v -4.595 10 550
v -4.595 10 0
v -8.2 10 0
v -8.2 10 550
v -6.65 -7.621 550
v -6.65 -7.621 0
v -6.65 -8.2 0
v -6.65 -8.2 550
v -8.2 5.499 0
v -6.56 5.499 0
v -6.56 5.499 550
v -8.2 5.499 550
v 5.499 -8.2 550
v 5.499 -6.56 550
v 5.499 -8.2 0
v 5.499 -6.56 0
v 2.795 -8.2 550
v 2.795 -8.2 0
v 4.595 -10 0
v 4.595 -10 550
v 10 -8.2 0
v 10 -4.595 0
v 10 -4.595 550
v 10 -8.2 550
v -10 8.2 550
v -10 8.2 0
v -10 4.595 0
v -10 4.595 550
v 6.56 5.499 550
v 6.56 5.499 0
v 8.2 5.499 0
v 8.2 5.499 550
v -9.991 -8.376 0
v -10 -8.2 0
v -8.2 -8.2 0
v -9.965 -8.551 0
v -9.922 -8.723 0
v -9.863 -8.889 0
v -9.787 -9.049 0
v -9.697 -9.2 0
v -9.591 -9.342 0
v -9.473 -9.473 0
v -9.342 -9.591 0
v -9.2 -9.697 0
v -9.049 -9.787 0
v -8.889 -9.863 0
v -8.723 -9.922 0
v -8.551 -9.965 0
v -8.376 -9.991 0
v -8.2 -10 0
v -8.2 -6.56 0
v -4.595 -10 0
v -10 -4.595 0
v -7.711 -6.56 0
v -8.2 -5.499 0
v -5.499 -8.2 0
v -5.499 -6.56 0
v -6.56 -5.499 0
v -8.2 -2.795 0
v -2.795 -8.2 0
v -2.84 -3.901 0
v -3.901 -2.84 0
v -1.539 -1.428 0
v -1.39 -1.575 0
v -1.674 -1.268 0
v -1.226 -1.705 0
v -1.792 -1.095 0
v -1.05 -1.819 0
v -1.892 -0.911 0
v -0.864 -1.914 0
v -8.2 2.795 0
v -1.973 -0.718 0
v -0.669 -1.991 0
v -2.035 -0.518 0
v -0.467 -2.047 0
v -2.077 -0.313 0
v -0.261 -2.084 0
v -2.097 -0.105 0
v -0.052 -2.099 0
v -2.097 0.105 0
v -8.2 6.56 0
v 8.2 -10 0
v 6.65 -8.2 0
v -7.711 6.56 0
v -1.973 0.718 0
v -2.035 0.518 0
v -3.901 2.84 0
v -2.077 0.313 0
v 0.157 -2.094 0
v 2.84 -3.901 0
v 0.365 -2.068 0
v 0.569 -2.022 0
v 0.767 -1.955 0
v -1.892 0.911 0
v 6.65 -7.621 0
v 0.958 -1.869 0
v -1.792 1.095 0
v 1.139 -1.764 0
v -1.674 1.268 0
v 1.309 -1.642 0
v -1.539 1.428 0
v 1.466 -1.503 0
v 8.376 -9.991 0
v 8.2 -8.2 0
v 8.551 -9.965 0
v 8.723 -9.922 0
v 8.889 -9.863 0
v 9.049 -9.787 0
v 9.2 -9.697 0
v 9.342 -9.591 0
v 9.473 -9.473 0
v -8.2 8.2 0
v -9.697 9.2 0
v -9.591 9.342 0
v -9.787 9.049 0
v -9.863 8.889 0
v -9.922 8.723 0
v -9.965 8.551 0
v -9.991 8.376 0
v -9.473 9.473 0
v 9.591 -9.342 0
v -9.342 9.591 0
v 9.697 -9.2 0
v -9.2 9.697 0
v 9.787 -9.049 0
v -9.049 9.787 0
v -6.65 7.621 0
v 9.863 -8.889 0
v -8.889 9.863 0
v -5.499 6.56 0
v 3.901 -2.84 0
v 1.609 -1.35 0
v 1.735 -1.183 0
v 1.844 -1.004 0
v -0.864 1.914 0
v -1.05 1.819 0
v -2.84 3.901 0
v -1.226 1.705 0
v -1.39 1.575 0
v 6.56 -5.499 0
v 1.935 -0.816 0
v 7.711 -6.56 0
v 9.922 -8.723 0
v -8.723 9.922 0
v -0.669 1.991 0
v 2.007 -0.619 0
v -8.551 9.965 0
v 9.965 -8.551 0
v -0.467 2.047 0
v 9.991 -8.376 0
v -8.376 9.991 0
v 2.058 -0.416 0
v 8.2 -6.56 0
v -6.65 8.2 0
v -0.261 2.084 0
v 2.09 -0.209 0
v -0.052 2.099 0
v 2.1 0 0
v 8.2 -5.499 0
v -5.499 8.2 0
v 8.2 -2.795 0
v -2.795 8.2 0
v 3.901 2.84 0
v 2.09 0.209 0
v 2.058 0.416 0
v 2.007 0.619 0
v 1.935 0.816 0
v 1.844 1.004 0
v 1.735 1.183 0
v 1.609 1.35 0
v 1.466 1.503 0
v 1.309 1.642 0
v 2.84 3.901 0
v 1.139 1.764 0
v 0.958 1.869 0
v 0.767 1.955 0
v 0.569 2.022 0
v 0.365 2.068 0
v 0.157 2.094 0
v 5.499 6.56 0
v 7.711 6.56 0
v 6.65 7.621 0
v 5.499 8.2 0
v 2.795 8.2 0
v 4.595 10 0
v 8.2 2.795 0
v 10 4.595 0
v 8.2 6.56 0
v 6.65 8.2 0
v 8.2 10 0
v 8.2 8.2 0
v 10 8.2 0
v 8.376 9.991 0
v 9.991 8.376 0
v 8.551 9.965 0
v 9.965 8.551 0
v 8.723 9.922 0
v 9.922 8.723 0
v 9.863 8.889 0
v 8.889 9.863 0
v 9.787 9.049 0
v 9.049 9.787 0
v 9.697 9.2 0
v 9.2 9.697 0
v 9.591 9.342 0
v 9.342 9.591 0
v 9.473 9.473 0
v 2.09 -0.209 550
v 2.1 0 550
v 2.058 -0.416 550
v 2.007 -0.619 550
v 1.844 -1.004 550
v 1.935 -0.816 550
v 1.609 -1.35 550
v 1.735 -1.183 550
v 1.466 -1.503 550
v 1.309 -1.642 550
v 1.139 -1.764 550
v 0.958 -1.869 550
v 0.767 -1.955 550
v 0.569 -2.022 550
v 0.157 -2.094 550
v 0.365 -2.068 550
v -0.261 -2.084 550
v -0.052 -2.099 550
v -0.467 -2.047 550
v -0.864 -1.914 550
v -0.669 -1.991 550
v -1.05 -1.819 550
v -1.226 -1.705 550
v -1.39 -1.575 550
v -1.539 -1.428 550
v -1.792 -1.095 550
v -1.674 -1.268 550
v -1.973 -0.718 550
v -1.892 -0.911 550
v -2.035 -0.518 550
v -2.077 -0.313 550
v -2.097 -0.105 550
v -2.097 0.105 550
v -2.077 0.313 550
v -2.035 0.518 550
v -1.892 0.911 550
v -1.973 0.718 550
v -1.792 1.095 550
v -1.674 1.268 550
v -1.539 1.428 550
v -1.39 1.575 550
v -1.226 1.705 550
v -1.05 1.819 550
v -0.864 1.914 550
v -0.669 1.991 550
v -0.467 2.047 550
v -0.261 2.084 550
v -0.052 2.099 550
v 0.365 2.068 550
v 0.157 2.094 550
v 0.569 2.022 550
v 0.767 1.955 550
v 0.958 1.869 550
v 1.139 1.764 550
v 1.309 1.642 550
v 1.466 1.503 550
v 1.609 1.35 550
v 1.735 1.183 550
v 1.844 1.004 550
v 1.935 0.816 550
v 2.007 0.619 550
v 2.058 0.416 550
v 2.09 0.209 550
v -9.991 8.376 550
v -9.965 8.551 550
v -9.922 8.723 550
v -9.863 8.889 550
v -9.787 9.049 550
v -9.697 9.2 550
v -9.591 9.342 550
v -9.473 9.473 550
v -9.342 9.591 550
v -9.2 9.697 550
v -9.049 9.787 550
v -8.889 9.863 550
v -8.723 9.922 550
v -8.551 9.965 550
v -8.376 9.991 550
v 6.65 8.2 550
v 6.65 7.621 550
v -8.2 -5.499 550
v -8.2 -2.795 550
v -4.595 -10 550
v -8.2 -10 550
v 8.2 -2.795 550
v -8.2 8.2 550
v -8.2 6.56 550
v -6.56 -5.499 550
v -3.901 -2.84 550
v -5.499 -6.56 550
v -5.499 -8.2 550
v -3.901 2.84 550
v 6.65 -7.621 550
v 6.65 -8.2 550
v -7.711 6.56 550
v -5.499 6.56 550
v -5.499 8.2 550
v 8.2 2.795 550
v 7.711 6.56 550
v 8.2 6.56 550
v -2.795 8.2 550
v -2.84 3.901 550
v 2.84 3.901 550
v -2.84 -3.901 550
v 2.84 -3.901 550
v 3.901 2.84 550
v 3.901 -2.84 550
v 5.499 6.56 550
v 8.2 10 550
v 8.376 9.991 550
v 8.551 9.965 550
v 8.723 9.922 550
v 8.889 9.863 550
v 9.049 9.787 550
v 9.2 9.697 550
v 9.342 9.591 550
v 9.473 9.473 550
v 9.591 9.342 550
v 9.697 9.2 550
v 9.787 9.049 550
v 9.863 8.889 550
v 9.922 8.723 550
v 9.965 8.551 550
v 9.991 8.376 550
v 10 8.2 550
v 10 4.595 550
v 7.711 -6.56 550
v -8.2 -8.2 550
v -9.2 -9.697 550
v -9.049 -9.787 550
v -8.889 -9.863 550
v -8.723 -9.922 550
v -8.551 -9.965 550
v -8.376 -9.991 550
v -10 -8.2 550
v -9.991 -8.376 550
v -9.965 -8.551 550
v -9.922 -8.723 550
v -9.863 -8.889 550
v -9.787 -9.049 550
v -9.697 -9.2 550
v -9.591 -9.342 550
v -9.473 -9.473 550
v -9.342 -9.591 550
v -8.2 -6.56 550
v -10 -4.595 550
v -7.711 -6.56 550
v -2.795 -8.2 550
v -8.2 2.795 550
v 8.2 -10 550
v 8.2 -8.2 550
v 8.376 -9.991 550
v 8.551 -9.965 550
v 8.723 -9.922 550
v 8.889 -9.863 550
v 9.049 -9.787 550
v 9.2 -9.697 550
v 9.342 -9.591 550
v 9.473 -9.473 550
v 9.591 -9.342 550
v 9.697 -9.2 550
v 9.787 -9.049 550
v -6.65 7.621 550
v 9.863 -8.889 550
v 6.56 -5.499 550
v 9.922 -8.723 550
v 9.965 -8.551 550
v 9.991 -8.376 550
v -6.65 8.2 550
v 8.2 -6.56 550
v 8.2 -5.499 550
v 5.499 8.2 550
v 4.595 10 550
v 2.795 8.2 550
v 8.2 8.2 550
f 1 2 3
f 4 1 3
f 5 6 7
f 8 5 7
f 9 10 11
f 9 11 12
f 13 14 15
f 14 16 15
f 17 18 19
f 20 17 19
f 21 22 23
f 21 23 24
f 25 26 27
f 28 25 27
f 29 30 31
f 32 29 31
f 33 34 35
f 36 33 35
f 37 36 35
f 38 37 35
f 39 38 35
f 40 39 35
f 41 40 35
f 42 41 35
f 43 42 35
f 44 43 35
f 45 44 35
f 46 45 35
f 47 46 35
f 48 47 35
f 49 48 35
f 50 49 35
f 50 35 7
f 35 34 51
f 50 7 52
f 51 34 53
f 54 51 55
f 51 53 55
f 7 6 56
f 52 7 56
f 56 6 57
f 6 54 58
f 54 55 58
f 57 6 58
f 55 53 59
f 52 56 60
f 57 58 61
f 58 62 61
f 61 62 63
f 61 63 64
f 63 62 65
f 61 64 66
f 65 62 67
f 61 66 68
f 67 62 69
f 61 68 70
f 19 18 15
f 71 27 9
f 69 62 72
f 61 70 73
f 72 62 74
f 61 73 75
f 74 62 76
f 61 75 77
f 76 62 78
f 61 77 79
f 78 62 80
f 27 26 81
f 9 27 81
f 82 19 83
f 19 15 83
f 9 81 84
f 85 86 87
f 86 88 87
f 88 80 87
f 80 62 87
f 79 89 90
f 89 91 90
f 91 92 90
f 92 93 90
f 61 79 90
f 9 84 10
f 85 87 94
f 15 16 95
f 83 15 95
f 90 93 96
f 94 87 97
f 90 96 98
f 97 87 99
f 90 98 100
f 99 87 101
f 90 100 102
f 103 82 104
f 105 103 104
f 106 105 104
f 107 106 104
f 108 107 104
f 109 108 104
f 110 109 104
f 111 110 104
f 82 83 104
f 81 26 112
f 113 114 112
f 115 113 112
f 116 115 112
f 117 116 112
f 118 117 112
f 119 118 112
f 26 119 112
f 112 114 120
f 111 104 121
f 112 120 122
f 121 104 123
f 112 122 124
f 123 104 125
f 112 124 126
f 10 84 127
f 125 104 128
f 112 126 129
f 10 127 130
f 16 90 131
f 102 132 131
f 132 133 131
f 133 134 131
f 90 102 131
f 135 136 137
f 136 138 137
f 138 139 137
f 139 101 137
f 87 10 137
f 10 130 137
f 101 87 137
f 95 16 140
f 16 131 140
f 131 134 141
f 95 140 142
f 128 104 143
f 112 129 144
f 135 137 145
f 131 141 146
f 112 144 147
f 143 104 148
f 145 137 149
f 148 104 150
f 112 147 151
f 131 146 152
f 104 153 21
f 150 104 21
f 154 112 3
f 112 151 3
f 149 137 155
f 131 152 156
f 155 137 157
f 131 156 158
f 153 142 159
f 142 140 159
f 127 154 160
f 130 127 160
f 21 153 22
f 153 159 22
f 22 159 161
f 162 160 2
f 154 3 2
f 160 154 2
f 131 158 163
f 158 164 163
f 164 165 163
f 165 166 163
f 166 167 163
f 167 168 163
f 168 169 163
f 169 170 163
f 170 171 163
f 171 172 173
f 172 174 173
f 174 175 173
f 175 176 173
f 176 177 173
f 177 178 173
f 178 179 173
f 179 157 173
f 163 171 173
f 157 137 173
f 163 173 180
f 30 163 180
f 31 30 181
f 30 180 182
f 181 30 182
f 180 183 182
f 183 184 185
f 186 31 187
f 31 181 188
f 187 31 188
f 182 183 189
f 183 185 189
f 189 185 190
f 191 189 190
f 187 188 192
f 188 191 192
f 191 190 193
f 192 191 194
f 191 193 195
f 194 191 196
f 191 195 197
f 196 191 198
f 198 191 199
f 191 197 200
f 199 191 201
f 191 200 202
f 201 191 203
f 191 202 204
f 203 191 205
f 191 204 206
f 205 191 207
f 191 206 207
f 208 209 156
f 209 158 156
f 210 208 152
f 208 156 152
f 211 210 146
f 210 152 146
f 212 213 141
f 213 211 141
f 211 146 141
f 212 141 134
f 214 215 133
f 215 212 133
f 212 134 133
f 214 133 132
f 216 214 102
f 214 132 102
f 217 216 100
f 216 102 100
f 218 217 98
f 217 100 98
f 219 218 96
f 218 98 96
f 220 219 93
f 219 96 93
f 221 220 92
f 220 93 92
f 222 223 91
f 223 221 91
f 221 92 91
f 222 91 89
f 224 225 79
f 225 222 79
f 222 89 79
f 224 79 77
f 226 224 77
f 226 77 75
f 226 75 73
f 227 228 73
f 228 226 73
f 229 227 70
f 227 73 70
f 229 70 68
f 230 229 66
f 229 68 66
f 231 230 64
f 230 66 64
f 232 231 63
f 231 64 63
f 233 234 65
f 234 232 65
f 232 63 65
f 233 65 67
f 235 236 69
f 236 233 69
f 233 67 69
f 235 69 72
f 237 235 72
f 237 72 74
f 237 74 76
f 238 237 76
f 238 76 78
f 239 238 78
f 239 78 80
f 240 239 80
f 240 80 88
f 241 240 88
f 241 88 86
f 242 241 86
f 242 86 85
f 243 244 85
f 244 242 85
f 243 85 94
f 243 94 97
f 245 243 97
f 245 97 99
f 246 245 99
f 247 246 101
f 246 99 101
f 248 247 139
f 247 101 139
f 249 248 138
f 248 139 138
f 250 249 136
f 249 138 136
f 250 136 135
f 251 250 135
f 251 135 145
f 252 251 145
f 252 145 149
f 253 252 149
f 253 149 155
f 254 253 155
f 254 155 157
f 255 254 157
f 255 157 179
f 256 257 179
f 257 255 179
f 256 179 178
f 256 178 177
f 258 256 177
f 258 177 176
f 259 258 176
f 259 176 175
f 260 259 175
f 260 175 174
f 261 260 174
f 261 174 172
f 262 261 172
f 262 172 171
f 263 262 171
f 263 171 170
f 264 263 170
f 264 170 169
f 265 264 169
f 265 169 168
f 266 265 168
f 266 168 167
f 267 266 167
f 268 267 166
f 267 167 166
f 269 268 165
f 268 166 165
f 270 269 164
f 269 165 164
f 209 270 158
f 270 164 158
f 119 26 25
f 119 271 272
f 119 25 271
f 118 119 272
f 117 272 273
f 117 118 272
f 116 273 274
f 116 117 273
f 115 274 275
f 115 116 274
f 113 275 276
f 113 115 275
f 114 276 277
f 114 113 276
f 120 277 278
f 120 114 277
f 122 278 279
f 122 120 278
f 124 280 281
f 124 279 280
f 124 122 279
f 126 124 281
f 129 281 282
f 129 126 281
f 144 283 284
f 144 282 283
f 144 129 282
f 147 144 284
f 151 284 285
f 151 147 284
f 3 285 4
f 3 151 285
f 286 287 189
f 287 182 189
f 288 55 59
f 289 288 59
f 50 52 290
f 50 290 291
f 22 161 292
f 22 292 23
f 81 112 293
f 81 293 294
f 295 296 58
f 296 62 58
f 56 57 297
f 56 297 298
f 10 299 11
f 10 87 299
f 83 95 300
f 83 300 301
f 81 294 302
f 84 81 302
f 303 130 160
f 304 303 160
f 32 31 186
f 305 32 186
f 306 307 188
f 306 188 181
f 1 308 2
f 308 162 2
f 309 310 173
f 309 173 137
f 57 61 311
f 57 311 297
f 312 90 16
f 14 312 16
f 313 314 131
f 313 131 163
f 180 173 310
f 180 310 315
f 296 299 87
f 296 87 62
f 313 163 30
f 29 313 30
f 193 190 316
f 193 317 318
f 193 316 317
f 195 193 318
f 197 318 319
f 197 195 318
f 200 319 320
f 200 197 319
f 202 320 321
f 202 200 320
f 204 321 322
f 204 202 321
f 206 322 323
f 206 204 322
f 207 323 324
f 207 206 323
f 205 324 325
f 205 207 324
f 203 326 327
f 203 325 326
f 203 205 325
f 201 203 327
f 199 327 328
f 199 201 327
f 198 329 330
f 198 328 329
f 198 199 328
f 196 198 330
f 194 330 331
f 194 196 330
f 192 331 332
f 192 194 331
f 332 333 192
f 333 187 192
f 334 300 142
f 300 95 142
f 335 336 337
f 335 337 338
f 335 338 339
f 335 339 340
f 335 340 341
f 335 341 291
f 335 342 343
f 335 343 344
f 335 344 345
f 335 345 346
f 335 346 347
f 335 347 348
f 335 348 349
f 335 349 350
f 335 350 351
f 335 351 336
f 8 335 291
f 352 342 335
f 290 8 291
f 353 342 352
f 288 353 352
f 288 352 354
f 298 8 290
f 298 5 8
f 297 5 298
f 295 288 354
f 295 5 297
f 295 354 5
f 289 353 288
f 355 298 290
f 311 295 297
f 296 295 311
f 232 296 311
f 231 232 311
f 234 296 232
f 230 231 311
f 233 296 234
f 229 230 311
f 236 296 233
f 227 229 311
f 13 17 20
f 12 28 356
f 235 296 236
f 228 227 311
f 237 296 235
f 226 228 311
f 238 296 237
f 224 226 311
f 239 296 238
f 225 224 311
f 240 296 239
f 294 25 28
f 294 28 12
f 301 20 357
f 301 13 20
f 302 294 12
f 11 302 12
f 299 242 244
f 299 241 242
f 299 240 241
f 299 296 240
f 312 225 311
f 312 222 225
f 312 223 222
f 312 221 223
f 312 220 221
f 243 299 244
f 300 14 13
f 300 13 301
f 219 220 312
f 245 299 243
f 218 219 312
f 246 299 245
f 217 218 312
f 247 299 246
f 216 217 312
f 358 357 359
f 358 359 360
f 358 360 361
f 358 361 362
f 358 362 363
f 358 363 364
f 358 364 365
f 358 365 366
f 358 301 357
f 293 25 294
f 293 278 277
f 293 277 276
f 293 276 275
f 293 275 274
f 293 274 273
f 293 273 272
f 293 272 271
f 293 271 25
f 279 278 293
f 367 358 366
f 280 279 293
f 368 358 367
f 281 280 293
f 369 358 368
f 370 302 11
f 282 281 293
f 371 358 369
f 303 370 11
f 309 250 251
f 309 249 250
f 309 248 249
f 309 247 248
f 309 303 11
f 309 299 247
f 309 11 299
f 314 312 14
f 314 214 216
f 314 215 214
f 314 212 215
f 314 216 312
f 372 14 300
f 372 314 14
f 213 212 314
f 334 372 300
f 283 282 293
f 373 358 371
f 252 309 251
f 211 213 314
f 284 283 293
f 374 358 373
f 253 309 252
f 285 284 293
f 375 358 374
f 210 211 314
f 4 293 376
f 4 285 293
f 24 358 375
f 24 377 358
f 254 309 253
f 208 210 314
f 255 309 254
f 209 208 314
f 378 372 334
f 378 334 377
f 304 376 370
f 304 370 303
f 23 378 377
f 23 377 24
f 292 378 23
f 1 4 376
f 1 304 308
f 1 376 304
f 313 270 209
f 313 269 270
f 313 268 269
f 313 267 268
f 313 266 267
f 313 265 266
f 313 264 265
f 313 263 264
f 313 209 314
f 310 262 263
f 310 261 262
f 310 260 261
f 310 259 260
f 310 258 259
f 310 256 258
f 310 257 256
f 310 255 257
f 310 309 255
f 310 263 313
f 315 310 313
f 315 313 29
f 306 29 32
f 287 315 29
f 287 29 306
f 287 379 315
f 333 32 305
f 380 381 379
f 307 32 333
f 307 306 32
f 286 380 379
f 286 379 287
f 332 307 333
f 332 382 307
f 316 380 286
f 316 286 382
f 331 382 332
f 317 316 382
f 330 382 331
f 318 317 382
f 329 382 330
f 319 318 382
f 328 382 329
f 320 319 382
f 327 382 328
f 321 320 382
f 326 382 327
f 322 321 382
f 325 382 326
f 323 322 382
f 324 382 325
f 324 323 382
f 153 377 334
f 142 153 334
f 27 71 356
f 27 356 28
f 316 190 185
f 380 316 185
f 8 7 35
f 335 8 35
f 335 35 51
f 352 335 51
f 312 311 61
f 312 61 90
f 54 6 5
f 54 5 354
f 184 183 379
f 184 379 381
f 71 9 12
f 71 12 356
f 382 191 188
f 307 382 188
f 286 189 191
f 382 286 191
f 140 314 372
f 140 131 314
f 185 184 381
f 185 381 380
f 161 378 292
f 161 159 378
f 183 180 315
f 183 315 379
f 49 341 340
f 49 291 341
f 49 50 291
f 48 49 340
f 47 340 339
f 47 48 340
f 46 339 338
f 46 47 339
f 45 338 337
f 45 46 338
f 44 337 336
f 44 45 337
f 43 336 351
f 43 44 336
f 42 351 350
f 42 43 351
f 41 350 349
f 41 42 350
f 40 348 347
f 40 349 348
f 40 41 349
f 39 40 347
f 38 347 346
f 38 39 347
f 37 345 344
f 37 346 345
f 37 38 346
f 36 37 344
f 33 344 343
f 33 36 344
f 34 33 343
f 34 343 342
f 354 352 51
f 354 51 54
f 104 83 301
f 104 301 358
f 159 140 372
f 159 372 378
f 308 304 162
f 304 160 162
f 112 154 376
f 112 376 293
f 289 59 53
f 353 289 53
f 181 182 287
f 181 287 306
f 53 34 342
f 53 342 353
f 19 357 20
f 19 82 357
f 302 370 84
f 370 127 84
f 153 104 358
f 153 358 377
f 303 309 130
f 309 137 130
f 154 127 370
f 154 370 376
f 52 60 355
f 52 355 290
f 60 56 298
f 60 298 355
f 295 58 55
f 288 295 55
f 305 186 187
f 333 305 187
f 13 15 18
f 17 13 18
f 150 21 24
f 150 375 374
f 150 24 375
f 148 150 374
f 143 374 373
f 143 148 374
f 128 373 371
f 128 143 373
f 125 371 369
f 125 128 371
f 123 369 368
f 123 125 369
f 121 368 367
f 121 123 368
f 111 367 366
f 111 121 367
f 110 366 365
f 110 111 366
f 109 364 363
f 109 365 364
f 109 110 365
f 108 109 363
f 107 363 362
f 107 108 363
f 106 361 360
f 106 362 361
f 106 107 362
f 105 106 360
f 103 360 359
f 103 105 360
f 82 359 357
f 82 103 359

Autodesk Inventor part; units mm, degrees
ref_plane "YZ Plane" through (0, 0, 0) normal (1, 0, 0) x (0, 1, 0)
ref_plane "Start Plane" through (0, 0, 0) normal (0, 0, 1) x (1, 0, 0)
ref_plane "End Plane" through (0, 0, 550) normal (0, 0, 1) x (1, 0, 0)
sketch "Sketch1" plane through (0, 0, 0) normal (0, 0, 1) x (1, 0, 0)
  line L0 (10, -4.5951) -> (10, -8.2)
  line L1 (-10, -8.2) -> (-10, -4.5951)
  line L2 (-10, 10) -> (10, -10) construction
  line L3 (10, 10) -> (-10, -10) construction
  circle A0 centre (0, 0) radius 2.1
  line L4 (-2.84, -3.9007) -> (2.84, -3.9007)
  line L5 (3.9007, -2.84) -> (3.9007, 2.84)
  line L6 (2.84, 3.9007) -> (-2.84, 3.9007)
  line L7 (-3.9007, 2.84) -> (-3.9007, -2.84)
  line L8 (-3.9007, -3.9007) -> (3.9007, 3.9007) construction
  line L9 (3.9007, -3.9007) -> (-3.9007, 3.9007) construction
  line L10 (-3.9007, -2.84) -> (-2.84, -3.9007) construction
  line L11 (-2.84, -3.9007) -> (-5.4993, -6.56)
  line L12 (-5.4993, -6.56) -> (-5.4993, -8.2)
  line L13 (-5.4993, -8.2) -> (-2.7951, -8.2)
  line L14 (-2.7951, -8.2) -> (-4.5951, -10)
  line L15 (0, 0) -> (0, -3.9007) construction
  line L16 (3.9007, -2.84) -> (2.84, -3.9007) construction
  line L17 (2.84, -3.9007) -> (5.4993, -6.56)
  line L18 (5.4993, -6.56) -> (5.4993, -8.2)
  line L19 (5.4993, -8.2) -> (2.7951, -8.2)
  line L20 (2.7951, -8.2) -> (4.5951, -10)
  line L21 (-2.84, -3.9007) -> (-3.9007, -2.84) construction
  line L22 (-3.9007, -2.84) -> (-6.56, -5.4993)
  line L23 (-6.56, -5.4993) -> (-8.2, -5.4993)
  line L24 (-8.2, -5.4993) -> (-8.2, -2.7951)
  line L25 (-8.2, -2.7951) -> (-10, -4.5951)
  line L26 (3.9007, -2.84) -> (6.56, -5.4993)
  line L27 (6.56, -5.4993) -> (8.2, -5.4993)
  line L28 (8.2, -5.4993) -> (8.2, -2.7951)
  line L29 (8.2, -2.7951) -> (10, -4.5951)
  arc A1 (-10, -8.2) -> (-8.2, -10) centre (-8.2, -8.2) ccw
  arc A2 (8.2, -10) -> (10, -8.2) centre (8.2, -8.2) ccw
  line L30 (-8.2, -6.56) -> (-7.7111, -6.56)
  line L31 (-6.6505, -8.2) -> (-8.2, -8.2)
  line L32 (-8.2, -8.2) -> (-8.2, -6.56)
  line L33 (-6.6505, -7.6207) -> (-7.7111, -6.56)
  line L34 (-6.6505, -7.6207) -> (-6.6505, -8.2)
  line L35 (8.2, -6.56) -> (7.7111, -6.56)
  line L36 (6.6505, -8.2) -> (8.2, -8.2)
  line L37 (8.2, -8.2) -> (8.2, -6.56)
  line L38 (6.6505, -7.6207) -> (7.7111, -6.56)
  line L39 (6.6505, -7.6207) -> (6.6505, -8.2)
  line L40 (8.2, -10) -> (4.5951, -10)
  line L41 (-4.5951, -10) -> (-8.2, -10)
  line L42 (-3.9007, 0) -> (3.9007, 0) construction
  line L43 (10, 4.5951) -> (10, 8.2)
  line L44 (-10, 8.2) -> (-10, 4.5951)
  line L45 (-2.84, 3.9007) -> (2.84, 3.9007)
  line L46 (-3.9007, 2.84) -> (-2.84, 3.9007) construction
  line L47 (-2.84, 3.9007) -> (-5.4993, 6.56)
  line L48 (-5.4993, 6.56) -> (-5.4993, 8.2)
  line L49 (-5.4993, 8.2) -> (-2.7951, 8.2)
  line L50 (-2.7951, 8.2) -> (-4.5951, 10)
  line L51 (2.84, 3.9007) -> (5.4993, 6.56)
  line L52 (5.4993, 6.56) -> (5.4993, 8.2)
  line L53 (5.4993, 8.2) -> (2.7951, 8.2)
  line L54 (2.7951, 8.2) -> (4.5951, 10)
  line L55 (3.9007, 2.84) -> (2.84, 3.9007) construction
  line L56 (-8.2, 2.7951) -> (-10, 4.5951)
  line L57 (-2.84, 3.9007) -> (-3.9007, 2.84) construction
  line L58 (-3.9007, 2.84) -> (-6.56, 5.4993)
  line L59 (-6.56, 5.4993) -> (-8.2, 5.4993)
  line L60 (-8.2, 5.4993) -> (-8.2, 2.7951)
  line L61 (3.9007, 2.84) -> (6.56, 5.4993)
  line L62 (6.56, 5.4993) -> (8.2, 5.4993)
  line L63 (8.2, 5.4993) -> (8.2, 2.7951)
  line L64 (8.2, 2.7951) -> (10, 4.5951)
  arc A3 (-8.2, 10) -> (-10, 8.2) centre (-8.2, 8.2) ccw
  arc A4 (10, 8.2) -> (8.2, 10) centre (8.2, 8.2) ccw
  line L65 (-8.2, 6.56) -> (-7.7111, 6.56)
  line L66 (-6.6505, 8.2) -> (-8.2, 8.2)
  line L67 (-8.2, 8.2) -> (-8.2, 6.56)
  line L68 (-6.6505, 7.6207) -> (-7.7111, 6.56)
  line L69 (-6.6505, 7.6207) -> (-6.6505, 8.2)
  line L70 (8.2, 6.56) -> (7.7111, 6.56)
  line L71 (6.6505, 7.6207) -> (7.7111, 6.56)
  line L72 (8.2, 8.2) -> (8.2, 6.56)
  line L73 (6.6505, 7.6207) -> (6.6505, 8.2)
  line L74 (6.6505, 8.2) -> (8.2, 8.2)
  line L75 (8.2, 10) -> (4.5951, 10)
  line L76 (-4.5951, 10) -> (-8.2, 10)
  line L77 (-8.2, 10) -> (-4.5951, 10)
  line L78 (4.5951, 10) -> (8.2, 10)
  point P0 (8.2, -8.2)
  point P1 (0, 3.9007)
  point P2 (8.2, 8.2)
  dimension "Width" = 20
  dimension "Height" = 20
  dimension "d2" = 4.2
  dimension "d3" = 1.5
  dimension "d4" = 1.64
  dimension "d6" = 5.68
  dimension "d7" = 1.8
  dimension "d9" = 1.5
extrude "Body" add sketch "Sketch1" along normal up to surface (550 mm away) from surface at 0
sketch "Sketch4" plane through (0, 0, 0) normal (0, 0, 1) x (1, 0, 0)
  line L0 (0, 0) -> (10, 0)
ref_plane "Work Plane4" through (0, 0, 0) normal (0, -1, 0) x (1, 0, 0)
sketch "Sketch5" plane through (0, 0, 0) normal (0, -1, 0) x (1, 0, 0)
  line L0 (-2, 0) -> (12, 0) construction
  line L1 (-2, 550) -> (12, 550) construction
  dimension "d17" = 550
equation "\"G_OFFSET_START\" = 0"
equation "\"G_OFFSET_END\" = 0"
equation "\"G_L\" = d17"
properties part number "V-slot 20 mm x 20 mm" material "Aluminum 6061"
